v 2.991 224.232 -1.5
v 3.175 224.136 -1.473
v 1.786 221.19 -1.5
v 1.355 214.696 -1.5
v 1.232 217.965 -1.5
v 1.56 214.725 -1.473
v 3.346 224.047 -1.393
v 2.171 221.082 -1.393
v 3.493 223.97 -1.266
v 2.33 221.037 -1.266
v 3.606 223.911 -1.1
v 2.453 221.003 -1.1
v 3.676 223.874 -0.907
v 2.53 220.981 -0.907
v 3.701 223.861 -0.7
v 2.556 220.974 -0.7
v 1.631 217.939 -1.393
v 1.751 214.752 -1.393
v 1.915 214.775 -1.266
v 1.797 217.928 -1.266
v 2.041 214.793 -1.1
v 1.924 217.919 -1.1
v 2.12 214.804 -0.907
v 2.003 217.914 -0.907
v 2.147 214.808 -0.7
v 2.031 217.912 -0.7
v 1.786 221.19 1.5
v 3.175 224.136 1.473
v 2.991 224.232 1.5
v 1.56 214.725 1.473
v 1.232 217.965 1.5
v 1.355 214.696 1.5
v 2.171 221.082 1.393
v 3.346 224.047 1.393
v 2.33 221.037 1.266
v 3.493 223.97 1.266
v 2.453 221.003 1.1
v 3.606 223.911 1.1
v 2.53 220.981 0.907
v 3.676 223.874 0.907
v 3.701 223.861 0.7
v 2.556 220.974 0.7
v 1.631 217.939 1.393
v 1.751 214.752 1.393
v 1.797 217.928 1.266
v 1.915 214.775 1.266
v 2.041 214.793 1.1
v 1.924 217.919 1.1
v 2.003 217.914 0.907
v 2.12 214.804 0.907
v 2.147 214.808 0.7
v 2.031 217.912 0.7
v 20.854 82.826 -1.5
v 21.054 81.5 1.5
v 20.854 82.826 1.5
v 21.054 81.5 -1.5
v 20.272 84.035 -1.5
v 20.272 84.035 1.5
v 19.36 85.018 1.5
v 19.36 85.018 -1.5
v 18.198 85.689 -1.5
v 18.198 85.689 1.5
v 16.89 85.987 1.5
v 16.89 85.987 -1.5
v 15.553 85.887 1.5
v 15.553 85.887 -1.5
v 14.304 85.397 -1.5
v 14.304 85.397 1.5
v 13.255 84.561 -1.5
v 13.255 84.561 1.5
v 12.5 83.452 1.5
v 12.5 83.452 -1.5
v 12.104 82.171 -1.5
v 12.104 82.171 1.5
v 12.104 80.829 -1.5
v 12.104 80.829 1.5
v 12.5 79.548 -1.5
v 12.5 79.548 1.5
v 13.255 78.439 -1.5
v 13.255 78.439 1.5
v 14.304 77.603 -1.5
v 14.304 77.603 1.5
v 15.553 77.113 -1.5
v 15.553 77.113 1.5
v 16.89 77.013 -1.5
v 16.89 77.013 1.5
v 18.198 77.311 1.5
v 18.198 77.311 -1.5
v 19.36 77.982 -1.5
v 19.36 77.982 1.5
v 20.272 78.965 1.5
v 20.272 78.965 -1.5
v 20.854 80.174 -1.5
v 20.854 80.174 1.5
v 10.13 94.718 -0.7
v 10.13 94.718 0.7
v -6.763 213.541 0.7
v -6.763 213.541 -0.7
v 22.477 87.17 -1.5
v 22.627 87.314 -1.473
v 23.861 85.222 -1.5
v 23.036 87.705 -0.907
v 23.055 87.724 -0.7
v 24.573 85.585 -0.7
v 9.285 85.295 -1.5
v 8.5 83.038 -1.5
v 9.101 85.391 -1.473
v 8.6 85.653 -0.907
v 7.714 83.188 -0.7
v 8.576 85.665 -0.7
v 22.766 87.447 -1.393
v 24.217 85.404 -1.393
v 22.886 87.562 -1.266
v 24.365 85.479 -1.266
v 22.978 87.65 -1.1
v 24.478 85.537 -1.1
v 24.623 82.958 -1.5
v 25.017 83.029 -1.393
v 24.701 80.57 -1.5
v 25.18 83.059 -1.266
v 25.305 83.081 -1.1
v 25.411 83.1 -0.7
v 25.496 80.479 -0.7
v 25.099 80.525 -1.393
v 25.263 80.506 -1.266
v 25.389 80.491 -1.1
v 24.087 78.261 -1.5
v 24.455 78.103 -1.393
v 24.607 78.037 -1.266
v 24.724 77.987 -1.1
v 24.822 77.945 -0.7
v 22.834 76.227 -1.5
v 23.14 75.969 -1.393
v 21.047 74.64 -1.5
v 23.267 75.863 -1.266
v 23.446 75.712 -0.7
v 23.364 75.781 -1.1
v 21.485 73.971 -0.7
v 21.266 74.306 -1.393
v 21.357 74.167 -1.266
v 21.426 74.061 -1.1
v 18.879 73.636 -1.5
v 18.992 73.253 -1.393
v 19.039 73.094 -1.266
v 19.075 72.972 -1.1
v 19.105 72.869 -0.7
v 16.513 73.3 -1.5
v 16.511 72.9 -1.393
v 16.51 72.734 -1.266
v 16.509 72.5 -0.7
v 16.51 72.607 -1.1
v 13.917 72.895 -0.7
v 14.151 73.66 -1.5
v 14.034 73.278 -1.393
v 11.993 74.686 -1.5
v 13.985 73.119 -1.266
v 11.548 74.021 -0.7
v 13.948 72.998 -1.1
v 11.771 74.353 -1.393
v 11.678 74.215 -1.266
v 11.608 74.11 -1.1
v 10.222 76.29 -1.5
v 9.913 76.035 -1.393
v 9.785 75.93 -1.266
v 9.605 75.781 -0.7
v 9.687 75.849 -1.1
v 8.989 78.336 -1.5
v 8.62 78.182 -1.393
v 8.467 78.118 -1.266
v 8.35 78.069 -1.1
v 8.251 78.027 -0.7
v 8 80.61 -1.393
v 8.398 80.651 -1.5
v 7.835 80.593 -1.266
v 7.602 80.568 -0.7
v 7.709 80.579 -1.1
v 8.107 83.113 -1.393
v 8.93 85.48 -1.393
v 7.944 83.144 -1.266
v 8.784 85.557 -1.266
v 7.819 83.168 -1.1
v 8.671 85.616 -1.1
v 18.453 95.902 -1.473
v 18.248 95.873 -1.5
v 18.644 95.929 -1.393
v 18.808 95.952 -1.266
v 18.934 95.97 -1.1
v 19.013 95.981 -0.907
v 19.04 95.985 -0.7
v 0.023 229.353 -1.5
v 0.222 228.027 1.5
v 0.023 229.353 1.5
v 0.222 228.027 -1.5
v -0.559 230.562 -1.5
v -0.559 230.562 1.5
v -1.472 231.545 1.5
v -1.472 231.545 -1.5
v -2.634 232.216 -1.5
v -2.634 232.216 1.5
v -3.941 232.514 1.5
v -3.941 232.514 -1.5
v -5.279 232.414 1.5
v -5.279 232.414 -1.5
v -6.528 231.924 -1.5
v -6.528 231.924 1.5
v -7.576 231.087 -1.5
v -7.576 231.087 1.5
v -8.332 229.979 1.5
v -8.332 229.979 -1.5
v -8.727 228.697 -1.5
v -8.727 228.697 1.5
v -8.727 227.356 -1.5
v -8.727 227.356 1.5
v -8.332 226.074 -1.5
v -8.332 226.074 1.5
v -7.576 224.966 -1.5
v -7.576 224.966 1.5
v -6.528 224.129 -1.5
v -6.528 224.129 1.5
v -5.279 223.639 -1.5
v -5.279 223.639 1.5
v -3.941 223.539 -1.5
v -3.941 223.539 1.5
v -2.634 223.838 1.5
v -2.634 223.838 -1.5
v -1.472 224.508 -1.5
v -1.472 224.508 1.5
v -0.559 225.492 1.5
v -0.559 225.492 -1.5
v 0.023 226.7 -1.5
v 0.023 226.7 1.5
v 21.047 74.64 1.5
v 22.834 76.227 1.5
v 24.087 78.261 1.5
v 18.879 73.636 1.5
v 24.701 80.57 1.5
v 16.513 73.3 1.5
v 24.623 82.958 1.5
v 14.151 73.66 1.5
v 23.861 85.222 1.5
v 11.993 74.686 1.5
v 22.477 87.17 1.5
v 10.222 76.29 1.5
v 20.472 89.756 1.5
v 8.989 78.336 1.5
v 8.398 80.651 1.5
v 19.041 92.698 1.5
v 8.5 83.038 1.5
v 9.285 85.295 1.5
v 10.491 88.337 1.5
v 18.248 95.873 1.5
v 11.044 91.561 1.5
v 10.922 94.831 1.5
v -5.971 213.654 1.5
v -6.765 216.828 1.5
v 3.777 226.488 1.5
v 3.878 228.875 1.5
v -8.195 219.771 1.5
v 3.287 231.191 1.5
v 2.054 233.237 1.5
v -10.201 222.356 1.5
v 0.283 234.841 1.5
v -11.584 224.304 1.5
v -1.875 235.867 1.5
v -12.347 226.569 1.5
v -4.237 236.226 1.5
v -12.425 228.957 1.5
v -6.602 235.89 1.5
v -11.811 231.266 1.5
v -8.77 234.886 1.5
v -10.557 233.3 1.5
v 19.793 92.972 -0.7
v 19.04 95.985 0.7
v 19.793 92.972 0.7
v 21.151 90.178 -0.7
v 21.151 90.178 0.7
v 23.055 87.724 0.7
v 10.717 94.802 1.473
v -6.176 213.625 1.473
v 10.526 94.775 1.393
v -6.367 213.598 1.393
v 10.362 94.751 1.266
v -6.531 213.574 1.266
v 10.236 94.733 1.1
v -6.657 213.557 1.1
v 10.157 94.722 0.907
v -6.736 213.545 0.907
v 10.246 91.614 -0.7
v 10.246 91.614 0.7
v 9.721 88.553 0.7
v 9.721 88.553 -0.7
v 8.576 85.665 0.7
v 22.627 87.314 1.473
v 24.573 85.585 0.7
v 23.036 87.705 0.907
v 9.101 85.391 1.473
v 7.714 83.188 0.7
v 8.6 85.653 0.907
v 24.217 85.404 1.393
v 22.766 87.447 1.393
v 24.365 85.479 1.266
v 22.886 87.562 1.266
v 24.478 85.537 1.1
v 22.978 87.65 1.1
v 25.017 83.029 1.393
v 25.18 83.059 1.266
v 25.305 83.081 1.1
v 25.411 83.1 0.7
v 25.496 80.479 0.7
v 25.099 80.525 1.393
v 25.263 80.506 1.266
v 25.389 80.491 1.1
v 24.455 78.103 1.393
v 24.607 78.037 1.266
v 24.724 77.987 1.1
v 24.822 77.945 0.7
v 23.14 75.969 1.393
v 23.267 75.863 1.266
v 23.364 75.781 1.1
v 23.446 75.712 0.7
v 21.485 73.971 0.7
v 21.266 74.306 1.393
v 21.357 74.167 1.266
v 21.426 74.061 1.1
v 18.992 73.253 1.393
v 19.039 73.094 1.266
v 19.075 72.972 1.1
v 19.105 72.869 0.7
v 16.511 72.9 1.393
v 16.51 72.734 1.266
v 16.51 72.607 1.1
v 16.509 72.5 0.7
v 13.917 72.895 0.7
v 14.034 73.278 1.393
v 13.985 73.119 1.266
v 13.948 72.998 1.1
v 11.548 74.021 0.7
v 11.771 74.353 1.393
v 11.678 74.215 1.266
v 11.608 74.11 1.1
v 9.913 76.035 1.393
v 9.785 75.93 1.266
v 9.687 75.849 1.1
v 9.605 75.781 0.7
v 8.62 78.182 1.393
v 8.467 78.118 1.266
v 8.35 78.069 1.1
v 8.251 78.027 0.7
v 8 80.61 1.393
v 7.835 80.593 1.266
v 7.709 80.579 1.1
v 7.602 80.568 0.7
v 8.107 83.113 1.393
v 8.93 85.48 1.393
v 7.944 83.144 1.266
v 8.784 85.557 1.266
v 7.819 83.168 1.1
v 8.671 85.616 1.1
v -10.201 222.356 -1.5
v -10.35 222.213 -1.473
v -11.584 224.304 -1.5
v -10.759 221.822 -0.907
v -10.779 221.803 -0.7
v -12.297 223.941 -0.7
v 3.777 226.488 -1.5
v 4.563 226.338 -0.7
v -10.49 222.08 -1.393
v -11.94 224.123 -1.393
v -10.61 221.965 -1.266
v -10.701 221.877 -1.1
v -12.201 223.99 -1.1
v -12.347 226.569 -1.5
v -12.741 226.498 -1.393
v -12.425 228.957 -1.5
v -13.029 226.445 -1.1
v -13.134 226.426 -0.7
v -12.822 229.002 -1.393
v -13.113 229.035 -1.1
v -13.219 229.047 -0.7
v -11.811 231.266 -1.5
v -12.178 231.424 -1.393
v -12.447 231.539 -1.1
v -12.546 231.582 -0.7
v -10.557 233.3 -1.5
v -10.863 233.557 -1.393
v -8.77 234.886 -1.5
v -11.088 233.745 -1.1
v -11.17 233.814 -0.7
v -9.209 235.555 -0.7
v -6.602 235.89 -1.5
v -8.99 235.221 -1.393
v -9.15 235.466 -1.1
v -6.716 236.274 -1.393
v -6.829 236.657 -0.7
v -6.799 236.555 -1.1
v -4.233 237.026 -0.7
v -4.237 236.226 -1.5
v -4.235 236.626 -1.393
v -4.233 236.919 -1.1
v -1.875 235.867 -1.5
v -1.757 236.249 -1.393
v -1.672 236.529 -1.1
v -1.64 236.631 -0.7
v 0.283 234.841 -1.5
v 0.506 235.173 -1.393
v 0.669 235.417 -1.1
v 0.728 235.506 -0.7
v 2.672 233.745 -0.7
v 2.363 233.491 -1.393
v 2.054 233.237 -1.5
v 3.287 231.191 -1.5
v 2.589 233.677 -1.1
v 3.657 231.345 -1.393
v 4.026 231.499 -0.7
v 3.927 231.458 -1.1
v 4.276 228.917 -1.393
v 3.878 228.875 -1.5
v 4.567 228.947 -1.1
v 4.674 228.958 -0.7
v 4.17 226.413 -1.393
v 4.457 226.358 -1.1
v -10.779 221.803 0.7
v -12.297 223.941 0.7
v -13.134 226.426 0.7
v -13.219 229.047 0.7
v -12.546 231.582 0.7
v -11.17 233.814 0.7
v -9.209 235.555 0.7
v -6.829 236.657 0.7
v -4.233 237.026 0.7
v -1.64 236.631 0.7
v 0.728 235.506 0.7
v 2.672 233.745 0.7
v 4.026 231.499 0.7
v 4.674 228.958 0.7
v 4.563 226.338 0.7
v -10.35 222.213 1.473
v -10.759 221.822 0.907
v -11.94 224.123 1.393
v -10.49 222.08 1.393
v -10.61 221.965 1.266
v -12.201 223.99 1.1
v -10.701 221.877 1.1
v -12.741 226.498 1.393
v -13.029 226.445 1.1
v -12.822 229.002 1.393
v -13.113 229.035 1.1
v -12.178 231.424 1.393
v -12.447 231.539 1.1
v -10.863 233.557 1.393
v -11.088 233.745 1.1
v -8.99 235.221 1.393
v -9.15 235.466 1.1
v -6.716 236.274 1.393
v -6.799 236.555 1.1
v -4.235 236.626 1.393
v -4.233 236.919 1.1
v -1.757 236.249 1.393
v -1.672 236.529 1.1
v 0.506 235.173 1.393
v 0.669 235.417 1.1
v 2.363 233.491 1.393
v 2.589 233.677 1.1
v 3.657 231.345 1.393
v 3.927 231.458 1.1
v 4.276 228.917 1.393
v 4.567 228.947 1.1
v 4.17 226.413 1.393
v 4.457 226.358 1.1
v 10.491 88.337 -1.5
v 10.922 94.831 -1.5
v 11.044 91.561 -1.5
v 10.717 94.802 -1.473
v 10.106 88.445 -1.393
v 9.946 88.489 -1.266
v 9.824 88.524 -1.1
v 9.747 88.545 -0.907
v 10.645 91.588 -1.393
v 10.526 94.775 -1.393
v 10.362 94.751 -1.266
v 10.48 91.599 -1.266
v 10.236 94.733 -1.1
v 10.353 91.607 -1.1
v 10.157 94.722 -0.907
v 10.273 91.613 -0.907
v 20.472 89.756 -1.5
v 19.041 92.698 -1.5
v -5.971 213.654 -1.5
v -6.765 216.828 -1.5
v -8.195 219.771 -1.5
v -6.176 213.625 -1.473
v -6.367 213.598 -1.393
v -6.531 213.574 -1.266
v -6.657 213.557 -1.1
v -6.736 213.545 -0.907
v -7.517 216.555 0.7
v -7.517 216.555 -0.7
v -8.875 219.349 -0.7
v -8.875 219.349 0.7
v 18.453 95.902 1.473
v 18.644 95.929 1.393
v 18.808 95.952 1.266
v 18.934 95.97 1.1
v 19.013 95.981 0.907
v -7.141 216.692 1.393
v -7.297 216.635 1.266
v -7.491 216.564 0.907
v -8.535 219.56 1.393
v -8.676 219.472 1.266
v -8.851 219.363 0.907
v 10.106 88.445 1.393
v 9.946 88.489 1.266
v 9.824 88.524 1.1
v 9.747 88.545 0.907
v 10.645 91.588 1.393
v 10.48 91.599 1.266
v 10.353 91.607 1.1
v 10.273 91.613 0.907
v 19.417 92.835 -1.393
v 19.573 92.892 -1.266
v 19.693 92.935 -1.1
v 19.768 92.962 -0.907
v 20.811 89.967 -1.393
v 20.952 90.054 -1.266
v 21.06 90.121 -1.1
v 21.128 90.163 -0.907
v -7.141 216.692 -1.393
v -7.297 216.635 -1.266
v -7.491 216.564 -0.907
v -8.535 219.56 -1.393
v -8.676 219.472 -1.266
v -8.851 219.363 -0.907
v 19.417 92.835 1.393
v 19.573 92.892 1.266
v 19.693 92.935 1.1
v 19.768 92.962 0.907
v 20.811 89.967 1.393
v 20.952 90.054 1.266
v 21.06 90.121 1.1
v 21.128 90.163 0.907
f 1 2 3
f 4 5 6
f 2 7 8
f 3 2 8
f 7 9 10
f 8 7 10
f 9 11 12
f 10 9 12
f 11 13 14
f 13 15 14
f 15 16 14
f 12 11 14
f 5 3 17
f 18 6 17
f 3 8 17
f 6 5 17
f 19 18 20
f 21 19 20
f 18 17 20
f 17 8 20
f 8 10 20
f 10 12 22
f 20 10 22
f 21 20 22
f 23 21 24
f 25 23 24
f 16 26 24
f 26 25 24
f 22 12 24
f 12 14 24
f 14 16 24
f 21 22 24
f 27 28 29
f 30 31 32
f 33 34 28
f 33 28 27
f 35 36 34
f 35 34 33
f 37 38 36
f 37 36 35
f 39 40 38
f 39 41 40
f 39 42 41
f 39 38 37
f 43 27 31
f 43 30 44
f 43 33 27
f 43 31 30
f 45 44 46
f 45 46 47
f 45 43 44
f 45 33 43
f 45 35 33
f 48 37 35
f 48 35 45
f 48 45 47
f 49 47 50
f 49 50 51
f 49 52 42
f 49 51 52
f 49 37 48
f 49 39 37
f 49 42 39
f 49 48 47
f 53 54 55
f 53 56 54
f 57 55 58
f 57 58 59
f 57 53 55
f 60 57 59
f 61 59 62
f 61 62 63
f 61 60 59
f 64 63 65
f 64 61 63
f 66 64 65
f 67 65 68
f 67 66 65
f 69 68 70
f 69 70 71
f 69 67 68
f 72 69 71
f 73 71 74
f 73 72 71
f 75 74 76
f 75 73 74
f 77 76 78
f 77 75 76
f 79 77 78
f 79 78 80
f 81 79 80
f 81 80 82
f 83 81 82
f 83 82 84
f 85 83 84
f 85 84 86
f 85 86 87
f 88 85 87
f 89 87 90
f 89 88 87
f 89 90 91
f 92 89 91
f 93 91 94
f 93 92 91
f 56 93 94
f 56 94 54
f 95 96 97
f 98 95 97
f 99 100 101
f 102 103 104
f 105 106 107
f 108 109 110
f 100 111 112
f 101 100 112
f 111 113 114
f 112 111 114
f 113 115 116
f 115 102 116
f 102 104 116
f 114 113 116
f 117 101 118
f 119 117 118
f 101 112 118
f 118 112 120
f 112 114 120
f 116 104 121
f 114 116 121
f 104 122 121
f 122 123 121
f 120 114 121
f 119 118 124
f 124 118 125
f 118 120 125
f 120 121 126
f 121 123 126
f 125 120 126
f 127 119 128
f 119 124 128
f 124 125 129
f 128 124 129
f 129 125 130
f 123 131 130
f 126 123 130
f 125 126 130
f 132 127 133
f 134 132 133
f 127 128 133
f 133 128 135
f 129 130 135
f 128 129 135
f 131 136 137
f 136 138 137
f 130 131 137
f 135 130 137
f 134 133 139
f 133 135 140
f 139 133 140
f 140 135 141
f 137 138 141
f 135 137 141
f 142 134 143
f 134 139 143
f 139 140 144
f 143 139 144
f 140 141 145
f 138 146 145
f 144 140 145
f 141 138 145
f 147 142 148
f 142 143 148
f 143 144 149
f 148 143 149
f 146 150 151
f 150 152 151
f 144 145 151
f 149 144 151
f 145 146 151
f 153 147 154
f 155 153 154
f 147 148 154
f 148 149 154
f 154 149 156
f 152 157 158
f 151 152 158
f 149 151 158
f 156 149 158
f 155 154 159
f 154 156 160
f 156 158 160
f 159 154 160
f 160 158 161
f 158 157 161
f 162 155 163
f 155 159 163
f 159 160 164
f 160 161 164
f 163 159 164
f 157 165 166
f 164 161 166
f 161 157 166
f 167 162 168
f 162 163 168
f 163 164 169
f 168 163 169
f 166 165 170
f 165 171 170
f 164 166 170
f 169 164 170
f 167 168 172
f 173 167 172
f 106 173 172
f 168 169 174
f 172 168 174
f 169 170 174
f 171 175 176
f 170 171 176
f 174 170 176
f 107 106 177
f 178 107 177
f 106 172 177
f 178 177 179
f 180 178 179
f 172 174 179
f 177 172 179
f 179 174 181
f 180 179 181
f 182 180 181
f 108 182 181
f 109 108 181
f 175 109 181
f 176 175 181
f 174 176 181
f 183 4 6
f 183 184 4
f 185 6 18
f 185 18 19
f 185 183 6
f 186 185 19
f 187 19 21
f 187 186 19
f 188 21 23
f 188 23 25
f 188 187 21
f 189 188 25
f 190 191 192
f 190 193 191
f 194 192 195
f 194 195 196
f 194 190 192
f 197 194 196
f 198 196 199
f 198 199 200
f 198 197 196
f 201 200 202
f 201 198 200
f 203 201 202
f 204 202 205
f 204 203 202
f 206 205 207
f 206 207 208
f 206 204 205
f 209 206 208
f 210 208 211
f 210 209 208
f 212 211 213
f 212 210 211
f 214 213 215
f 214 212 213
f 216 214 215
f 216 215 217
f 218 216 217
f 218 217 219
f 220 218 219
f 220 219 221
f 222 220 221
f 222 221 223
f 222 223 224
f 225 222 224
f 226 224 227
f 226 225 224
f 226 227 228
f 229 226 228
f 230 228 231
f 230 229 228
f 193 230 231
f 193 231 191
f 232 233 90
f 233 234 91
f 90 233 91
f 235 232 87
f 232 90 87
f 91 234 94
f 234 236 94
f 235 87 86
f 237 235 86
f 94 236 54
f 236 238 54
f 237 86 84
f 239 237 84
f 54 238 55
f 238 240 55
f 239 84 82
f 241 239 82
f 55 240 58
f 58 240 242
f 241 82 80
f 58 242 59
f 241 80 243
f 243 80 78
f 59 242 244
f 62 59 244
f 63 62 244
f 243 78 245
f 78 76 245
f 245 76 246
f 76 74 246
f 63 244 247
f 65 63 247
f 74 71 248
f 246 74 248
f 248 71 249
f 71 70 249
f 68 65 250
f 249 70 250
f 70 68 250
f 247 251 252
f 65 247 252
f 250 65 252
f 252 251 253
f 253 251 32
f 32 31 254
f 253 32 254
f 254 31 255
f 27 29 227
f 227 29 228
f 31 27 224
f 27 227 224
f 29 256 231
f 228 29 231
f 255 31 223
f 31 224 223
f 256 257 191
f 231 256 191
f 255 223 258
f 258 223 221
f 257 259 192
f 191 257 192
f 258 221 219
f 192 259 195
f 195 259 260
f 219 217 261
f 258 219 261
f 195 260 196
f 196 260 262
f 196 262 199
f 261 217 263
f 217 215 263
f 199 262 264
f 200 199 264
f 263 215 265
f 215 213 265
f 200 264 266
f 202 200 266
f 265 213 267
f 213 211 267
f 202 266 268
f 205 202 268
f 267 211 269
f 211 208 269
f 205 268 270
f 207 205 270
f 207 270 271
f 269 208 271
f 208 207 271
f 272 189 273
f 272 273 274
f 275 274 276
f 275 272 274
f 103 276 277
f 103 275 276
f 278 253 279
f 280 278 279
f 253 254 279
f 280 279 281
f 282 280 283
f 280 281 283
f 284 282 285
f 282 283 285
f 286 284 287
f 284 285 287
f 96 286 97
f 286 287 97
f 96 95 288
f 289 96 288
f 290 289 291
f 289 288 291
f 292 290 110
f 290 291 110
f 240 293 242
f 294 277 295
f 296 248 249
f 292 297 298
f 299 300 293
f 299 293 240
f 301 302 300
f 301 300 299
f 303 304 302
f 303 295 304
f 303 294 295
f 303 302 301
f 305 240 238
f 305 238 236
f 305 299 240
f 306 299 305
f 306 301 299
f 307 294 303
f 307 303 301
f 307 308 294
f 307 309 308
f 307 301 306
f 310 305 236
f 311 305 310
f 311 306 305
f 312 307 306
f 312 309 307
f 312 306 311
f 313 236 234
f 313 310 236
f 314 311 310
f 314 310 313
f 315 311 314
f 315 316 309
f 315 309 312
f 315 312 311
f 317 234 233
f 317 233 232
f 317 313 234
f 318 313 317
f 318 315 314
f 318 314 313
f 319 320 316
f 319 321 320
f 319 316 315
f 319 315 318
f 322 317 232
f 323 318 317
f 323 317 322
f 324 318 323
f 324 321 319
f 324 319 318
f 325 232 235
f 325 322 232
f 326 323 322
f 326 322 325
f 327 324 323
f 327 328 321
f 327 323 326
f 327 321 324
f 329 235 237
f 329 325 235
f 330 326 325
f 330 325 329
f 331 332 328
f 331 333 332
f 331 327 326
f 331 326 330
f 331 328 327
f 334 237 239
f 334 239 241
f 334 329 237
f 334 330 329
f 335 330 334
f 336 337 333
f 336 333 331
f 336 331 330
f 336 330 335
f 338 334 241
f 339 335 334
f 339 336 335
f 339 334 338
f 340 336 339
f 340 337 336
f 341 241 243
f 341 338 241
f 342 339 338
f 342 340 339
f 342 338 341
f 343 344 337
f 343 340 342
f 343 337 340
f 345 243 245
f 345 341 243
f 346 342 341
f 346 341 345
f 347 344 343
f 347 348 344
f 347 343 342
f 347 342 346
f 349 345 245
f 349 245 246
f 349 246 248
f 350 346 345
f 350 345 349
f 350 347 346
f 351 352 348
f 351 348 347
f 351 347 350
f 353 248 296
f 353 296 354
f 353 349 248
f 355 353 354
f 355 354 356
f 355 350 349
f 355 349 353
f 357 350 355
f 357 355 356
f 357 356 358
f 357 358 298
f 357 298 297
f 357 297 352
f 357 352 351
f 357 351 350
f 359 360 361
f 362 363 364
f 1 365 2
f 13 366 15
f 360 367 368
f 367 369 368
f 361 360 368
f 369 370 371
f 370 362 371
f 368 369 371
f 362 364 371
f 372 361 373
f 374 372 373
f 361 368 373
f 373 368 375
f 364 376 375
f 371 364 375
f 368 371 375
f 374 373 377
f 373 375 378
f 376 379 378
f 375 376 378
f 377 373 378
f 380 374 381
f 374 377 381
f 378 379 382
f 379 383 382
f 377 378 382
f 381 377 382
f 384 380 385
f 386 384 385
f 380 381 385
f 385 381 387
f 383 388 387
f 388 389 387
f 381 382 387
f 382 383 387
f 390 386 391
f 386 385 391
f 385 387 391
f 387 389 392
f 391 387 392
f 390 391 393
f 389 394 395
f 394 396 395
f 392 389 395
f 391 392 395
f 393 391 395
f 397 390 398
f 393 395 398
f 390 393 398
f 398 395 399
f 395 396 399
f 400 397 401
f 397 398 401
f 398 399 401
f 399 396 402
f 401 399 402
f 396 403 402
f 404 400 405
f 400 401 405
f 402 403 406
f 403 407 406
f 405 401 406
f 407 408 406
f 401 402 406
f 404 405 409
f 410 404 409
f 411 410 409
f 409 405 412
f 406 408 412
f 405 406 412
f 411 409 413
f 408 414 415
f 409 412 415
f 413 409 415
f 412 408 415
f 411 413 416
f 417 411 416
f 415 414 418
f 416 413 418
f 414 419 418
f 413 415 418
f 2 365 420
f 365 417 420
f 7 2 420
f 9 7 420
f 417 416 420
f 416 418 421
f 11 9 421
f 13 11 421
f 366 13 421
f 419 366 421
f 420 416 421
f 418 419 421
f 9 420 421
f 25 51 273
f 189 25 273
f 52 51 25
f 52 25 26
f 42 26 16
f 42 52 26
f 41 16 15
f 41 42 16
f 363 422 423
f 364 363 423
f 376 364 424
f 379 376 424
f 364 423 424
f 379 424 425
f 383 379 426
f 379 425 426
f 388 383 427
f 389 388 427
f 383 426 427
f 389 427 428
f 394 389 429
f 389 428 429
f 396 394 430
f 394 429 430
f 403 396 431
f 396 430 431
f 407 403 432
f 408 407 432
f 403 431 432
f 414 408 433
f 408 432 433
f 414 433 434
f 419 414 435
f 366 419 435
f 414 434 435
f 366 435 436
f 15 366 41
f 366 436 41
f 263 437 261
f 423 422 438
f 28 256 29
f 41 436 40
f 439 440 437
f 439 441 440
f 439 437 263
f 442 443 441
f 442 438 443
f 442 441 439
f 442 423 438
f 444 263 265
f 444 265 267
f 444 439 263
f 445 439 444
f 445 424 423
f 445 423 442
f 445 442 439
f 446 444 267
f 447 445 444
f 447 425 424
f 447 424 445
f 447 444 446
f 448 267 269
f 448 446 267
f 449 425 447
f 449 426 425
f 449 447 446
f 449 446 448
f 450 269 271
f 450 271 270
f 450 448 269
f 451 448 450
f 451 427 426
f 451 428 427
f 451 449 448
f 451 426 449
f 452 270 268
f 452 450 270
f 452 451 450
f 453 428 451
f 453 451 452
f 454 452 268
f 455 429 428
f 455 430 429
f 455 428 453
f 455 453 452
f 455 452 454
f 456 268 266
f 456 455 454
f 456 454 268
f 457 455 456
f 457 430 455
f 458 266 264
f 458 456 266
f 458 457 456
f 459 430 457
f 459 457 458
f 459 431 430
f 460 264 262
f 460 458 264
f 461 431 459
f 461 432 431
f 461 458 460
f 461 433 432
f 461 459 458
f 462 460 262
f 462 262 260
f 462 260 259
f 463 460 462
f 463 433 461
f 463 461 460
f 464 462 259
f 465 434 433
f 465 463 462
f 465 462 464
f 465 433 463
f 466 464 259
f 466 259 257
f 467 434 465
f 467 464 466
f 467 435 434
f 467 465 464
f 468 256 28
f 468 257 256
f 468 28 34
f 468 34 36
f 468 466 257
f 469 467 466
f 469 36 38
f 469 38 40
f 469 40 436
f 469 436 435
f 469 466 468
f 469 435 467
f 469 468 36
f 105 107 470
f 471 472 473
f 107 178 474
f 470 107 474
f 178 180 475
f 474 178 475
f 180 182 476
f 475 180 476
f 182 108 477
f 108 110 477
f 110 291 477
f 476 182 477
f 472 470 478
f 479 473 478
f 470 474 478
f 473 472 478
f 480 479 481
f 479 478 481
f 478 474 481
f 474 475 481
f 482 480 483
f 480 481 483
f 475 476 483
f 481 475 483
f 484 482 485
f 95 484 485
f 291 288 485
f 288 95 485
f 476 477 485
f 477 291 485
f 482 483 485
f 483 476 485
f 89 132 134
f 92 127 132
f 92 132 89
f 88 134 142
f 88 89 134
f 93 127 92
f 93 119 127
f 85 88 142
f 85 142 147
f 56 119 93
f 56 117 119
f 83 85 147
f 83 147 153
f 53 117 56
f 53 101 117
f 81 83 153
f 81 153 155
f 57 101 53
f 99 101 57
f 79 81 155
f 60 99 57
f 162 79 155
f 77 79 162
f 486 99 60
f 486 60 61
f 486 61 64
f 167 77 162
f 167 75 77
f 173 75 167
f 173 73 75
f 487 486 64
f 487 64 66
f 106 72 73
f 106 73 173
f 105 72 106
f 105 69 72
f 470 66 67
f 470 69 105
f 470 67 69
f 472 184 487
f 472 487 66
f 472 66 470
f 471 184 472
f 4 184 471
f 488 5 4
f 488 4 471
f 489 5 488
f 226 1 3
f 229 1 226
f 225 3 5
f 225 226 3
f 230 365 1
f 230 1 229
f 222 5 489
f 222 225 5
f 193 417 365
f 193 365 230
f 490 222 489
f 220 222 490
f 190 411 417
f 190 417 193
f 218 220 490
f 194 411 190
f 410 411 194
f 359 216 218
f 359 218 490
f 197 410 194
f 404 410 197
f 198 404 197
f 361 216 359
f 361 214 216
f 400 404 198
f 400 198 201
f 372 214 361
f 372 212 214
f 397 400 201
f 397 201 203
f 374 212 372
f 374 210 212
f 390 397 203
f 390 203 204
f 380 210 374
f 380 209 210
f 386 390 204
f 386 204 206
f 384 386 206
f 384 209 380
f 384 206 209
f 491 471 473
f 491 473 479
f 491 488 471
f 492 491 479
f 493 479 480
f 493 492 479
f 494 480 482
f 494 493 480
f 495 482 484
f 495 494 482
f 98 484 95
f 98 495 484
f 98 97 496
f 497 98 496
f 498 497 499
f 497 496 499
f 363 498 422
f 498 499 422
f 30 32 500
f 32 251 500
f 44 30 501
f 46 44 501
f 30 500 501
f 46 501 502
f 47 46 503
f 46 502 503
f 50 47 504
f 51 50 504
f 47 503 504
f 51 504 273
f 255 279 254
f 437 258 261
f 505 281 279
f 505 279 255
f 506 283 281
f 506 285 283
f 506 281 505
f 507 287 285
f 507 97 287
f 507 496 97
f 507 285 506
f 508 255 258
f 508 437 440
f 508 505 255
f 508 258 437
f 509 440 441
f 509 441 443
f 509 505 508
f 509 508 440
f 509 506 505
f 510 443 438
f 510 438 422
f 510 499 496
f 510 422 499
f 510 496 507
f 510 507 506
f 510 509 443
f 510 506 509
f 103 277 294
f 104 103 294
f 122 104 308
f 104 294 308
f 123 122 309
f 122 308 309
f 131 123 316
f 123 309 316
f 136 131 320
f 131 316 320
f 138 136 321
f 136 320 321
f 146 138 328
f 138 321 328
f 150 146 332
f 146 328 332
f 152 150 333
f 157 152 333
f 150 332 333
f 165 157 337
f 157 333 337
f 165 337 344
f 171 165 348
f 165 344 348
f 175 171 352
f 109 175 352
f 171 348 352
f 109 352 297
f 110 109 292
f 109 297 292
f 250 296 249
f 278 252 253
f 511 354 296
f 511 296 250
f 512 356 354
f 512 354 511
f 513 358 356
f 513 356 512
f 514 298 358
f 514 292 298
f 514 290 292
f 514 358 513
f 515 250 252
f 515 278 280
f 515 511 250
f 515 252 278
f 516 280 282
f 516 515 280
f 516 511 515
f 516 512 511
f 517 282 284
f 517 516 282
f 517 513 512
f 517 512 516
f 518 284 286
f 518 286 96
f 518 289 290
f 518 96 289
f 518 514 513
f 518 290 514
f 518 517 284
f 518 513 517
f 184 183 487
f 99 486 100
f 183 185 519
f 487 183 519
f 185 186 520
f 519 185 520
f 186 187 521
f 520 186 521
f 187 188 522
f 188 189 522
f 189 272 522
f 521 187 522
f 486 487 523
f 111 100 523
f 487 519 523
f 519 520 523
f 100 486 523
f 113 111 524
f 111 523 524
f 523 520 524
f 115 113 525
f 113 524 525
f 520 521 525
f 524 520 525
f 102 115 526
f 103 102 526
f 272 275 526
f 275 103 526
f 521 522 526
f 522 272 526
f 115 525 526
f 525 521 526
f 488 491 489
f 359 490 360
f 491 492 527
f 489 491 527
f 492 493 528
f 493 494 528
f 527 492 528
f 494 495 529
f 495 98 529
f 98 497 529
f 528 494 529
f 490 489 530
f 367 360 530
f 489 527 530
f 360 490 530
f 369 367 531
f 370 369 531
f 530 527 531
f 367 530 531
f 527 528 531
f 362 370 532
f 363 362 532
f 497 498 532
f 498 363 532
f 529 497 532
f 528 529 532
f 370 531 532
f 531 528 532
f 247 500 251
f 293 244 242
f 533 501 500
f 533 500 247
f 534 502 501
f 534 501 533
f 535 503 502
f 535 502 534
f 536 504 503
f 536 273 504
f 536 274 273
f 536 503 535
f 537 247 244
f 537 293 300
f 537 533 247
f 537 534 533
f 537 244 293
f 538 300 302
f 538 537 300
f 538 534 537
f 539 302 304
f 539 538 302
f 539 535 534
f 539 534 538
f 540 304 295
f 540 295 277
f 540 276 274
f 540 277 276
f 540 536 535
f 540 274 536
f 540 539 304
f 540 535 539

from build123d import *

# Parameters (mm, degrees)
SKETCH2_R           = 4.5
BOSS_EXTRUDE1_DEPTH = 1.5
FILLET2_R           = 15
FILLET1_R           = 0.8


with BuildPart() as part:
    # Sketch2 → Boss-Extrude1 (new, symmetric)
    with BuildSketch(Plane.XY):
        with BuildLine():
            Line((1.274716536, 220.943357999), (19.912187432, 89.850027402))
            ThreePointArc((19.912187432, 89.850027402), (17.820843773, 72.589598754), (11.001786186, 88.583240273))
            Line((11.001786186, 88.583240273), (-7.635684711, 219.67657087))
            ThreePointArc((-7.635684711, 219.67657087), (-5.544341051, 236.936999518), (1.274716536, 220.943357999))
        make_face()
        with Locations((-4.277553922, 228.026598272)):
            Circle(SKETCH2_R, mode=Mode.SUBTRACT)
        with Locations((16.554056644, 81.5)):
            Circle(SKETCH2_R, mode=Mode.SUBTRACT)
    extrude(amount=BOSS_EXTRUDE1_DEPTH, both=True)

    # Fillet2
    fillet2_edges = [part.edges().sort_by_distance(p)[0] for p in [
        (-7.635684711, 219.67657087, 0),
        (1.274716536, 220.943357999, 0),
        (19.912187432, 89.850027402, 0),
        (11.001786186, 88.583240273, 0),
    ]]
    fillet(fillet2_edges, radius=FILLET2_R)

    # Fillet1
    fillet1_edges = [part.edges().sort_by_distance(p)[0] for p in [
        (-5.544341051, 236.936999518, -1.5),
        (-5.544341051, 236.936999518, 1.5),
        (10.593451984, 155.396692701, -1.5),
        (10.593451984, 155.396692701, 1.5),
        (17.820843773, 72.589598754, -1.5),
        (17.820843773, 72.589598754, 1.5),
        (1.683050738, 154.129905572, -1.5),
        (1.683050738, 154.129905572, 1.5),
        (2.213746014, 219.456683126, -1.5),
        (2.213746014, 219.456683126, 1.5),
        (20.399664536, 91.539507977, -1.5),
        (20.399664536, 91.539507977, 1.5),
        (10.062756708, 90.069915146, -1.5),
        (10.062756708, 90.069915146, 1.5),
        (-8.123161814, 217.987090295, -1.5),
        (-8.123161814, 217.987090295, 1.5),
    ]]
    fillet(fillet1_edges, radius=FILLET1_R)


solid = part.part
